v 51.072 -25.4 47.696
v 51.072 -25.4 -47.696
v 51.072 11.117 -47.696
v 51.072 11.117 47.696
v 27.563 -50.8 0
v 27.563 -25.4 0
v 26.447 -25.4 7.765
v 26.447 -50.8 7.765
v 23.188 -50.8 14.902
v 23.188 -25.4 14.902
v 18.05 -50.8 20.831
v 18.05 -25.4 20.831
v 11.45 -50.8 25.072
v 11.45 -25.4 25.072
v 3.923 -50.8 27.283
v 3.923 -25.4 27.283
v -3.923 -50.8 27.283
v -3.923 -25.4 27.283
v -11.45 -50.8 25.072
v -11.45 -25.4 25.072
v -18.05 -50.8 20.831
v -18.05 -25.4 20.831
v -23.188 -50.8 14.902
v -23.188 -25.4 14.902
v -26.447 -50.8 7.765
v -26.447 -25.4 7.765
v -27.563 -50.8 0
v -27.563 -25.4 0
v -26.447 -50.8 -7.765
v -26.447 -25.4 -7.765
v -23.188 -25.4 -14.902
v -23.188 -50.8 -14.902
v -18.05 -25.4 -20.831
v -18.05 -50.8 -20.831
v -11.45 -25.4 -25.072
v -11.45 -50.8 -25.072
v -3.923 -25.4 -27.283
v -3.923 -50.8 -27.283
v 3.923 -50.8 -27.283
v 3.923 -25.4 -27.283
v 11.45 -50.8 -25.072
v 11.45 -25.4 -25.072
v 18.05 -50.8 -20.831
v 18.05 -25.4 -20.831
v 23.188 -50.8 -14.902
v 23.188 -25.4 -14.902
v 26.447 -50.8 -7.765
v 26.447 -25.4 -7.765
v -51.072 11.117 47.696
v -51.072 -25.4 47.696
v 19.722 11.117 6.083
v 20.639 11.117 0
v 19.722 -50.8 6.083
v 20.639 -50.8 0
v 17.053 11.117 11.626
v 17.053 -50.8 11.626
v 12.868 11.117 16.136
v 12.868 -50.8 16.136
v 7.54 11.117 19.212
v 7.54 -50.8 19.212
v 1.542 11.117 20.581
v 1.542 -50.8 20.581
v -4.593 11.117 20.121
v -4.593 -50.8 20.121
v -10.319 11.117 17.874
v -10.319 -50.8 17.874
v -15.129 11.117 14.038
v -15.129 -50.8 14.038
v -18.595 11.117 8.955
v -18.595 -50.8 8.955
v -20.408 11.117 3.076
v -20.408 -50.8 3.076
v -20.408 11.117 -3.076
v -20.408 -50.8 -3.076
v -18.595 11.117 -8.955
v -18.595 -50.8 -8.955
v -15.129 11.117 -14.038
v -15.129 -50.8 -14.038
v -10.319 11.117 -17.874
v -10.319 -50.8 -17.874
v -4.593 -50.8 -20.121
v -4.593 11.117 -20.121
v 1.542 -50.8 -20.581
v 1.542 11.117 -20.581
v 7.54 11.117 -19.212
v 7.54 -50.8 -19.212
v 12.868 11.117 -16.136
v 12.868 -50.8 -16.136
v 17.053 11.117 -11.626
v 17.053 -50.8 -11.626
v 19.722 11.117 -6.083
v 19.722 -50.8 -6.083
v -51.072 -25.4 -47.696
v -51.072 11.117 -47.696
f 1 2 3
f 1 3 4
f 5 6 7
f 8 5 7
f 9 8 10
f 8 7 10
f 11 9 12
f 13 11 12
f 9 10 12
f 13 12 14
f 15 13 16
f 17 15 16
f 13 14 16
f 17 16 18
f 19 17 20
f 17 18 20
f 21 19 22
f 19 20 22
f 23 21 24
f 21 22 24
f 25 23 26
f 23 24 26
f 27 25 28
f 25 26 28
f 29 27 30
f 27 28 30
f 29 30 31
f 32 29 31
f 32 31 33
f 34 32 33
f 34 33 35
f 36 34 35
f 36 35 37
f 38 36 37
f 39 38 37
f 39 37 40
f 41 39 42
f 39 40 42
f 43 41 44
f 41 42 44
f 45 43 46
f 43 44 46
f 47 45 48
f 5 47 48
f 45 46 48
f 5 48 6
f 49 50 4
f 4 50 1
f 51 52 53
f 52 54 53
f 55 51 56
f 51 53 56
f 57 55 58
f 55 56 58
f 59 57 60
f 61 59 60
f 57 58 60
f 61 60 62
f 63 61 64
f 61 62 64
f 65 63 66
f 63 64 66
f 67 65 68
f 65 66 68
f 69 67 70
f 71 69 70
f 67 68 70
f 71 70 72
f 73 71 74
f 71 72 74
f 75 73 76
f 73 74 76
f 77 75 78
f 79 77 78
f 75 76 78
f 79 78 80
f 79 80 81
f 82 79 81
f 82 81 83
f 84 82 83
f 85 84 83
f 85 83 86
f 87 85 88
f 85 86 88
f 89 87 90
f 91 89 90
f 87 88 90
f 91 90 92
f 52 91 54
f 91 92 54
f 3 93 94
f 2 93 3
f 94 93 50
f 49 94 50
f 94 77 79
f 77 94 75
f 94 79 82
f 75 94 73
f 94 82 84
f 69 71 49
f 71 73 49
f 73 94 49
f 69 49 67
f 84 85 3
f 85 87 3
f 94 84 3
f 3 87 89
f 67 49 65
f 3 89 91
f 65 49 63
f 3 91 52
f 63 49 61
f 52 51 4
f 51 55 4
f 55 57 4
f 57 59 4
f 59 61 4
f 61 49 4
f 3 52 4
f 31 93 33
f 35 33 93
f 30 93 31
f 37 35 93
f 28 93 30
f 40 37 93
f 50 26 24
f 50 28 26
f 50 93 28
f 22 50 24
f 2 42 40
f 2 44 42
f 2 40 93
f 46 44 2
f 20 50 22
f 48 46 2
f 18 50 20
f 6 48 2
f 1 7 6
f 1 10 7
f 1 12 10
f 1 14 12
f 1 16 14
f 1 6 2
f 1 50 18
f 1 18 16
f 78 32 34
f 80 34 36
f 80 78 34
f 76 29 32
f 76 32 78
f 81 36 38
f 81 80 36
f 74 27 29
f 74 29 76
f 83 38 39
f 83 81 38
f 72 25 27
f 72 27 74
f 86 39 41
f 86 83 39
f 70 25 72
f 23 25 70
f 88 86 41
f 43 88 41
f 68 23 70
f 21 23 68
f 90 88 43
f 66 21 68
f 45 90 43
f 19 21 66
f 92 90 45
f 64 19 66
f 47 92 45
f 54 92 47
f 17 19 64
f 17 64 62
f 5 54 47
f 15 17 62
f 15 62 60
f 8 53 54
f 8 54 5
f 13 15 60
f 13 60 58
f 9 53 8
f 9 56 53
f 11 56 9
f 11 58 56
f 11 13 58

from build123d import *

# Parameters (mm, degrees)
F0_W     = 102.1444201469
F0_H     = 95.3922867775
F1_DEPTH = 25.4
F2_R     = 27.5630659773
F4_DEPTH = 25.4
F5_R     = 20.638877023
F6_DEPTH = 50.801
F3_DEPTH = 11.1171808094


with BuildPart() as f1:
    # F0 (on Front) → F1 (new body)
    with BuildSketch(Plane.XZ):
        Rectangle(F0_W, F0_H)
    extrude(amount=F1_DEPTH)

    # F2 (on face) → F4 (join)
    with BuildSketch(Plane.XZ.offset(25.4)):
        Circle(F2_R)
    extrude(amount=F4_DEPTH)

    # F5 (on face) → F6 (cut, through all)
    with BuildSketch(Plane.XZ.offset(50.8)):
        Circle(F5_R)
    extrude(amount=-F6_DEPTH, mode=Mode.SUBTRACT)

    # F3 (add): a face of the model
    f3_faces = [f1.faces().sort_by_distance(p)[0] for p in [
        (0, 0, -46.2985321787),
    ]]
    extrude(f3_faces, amount=F3_DEPTH)


solid = f1.part
